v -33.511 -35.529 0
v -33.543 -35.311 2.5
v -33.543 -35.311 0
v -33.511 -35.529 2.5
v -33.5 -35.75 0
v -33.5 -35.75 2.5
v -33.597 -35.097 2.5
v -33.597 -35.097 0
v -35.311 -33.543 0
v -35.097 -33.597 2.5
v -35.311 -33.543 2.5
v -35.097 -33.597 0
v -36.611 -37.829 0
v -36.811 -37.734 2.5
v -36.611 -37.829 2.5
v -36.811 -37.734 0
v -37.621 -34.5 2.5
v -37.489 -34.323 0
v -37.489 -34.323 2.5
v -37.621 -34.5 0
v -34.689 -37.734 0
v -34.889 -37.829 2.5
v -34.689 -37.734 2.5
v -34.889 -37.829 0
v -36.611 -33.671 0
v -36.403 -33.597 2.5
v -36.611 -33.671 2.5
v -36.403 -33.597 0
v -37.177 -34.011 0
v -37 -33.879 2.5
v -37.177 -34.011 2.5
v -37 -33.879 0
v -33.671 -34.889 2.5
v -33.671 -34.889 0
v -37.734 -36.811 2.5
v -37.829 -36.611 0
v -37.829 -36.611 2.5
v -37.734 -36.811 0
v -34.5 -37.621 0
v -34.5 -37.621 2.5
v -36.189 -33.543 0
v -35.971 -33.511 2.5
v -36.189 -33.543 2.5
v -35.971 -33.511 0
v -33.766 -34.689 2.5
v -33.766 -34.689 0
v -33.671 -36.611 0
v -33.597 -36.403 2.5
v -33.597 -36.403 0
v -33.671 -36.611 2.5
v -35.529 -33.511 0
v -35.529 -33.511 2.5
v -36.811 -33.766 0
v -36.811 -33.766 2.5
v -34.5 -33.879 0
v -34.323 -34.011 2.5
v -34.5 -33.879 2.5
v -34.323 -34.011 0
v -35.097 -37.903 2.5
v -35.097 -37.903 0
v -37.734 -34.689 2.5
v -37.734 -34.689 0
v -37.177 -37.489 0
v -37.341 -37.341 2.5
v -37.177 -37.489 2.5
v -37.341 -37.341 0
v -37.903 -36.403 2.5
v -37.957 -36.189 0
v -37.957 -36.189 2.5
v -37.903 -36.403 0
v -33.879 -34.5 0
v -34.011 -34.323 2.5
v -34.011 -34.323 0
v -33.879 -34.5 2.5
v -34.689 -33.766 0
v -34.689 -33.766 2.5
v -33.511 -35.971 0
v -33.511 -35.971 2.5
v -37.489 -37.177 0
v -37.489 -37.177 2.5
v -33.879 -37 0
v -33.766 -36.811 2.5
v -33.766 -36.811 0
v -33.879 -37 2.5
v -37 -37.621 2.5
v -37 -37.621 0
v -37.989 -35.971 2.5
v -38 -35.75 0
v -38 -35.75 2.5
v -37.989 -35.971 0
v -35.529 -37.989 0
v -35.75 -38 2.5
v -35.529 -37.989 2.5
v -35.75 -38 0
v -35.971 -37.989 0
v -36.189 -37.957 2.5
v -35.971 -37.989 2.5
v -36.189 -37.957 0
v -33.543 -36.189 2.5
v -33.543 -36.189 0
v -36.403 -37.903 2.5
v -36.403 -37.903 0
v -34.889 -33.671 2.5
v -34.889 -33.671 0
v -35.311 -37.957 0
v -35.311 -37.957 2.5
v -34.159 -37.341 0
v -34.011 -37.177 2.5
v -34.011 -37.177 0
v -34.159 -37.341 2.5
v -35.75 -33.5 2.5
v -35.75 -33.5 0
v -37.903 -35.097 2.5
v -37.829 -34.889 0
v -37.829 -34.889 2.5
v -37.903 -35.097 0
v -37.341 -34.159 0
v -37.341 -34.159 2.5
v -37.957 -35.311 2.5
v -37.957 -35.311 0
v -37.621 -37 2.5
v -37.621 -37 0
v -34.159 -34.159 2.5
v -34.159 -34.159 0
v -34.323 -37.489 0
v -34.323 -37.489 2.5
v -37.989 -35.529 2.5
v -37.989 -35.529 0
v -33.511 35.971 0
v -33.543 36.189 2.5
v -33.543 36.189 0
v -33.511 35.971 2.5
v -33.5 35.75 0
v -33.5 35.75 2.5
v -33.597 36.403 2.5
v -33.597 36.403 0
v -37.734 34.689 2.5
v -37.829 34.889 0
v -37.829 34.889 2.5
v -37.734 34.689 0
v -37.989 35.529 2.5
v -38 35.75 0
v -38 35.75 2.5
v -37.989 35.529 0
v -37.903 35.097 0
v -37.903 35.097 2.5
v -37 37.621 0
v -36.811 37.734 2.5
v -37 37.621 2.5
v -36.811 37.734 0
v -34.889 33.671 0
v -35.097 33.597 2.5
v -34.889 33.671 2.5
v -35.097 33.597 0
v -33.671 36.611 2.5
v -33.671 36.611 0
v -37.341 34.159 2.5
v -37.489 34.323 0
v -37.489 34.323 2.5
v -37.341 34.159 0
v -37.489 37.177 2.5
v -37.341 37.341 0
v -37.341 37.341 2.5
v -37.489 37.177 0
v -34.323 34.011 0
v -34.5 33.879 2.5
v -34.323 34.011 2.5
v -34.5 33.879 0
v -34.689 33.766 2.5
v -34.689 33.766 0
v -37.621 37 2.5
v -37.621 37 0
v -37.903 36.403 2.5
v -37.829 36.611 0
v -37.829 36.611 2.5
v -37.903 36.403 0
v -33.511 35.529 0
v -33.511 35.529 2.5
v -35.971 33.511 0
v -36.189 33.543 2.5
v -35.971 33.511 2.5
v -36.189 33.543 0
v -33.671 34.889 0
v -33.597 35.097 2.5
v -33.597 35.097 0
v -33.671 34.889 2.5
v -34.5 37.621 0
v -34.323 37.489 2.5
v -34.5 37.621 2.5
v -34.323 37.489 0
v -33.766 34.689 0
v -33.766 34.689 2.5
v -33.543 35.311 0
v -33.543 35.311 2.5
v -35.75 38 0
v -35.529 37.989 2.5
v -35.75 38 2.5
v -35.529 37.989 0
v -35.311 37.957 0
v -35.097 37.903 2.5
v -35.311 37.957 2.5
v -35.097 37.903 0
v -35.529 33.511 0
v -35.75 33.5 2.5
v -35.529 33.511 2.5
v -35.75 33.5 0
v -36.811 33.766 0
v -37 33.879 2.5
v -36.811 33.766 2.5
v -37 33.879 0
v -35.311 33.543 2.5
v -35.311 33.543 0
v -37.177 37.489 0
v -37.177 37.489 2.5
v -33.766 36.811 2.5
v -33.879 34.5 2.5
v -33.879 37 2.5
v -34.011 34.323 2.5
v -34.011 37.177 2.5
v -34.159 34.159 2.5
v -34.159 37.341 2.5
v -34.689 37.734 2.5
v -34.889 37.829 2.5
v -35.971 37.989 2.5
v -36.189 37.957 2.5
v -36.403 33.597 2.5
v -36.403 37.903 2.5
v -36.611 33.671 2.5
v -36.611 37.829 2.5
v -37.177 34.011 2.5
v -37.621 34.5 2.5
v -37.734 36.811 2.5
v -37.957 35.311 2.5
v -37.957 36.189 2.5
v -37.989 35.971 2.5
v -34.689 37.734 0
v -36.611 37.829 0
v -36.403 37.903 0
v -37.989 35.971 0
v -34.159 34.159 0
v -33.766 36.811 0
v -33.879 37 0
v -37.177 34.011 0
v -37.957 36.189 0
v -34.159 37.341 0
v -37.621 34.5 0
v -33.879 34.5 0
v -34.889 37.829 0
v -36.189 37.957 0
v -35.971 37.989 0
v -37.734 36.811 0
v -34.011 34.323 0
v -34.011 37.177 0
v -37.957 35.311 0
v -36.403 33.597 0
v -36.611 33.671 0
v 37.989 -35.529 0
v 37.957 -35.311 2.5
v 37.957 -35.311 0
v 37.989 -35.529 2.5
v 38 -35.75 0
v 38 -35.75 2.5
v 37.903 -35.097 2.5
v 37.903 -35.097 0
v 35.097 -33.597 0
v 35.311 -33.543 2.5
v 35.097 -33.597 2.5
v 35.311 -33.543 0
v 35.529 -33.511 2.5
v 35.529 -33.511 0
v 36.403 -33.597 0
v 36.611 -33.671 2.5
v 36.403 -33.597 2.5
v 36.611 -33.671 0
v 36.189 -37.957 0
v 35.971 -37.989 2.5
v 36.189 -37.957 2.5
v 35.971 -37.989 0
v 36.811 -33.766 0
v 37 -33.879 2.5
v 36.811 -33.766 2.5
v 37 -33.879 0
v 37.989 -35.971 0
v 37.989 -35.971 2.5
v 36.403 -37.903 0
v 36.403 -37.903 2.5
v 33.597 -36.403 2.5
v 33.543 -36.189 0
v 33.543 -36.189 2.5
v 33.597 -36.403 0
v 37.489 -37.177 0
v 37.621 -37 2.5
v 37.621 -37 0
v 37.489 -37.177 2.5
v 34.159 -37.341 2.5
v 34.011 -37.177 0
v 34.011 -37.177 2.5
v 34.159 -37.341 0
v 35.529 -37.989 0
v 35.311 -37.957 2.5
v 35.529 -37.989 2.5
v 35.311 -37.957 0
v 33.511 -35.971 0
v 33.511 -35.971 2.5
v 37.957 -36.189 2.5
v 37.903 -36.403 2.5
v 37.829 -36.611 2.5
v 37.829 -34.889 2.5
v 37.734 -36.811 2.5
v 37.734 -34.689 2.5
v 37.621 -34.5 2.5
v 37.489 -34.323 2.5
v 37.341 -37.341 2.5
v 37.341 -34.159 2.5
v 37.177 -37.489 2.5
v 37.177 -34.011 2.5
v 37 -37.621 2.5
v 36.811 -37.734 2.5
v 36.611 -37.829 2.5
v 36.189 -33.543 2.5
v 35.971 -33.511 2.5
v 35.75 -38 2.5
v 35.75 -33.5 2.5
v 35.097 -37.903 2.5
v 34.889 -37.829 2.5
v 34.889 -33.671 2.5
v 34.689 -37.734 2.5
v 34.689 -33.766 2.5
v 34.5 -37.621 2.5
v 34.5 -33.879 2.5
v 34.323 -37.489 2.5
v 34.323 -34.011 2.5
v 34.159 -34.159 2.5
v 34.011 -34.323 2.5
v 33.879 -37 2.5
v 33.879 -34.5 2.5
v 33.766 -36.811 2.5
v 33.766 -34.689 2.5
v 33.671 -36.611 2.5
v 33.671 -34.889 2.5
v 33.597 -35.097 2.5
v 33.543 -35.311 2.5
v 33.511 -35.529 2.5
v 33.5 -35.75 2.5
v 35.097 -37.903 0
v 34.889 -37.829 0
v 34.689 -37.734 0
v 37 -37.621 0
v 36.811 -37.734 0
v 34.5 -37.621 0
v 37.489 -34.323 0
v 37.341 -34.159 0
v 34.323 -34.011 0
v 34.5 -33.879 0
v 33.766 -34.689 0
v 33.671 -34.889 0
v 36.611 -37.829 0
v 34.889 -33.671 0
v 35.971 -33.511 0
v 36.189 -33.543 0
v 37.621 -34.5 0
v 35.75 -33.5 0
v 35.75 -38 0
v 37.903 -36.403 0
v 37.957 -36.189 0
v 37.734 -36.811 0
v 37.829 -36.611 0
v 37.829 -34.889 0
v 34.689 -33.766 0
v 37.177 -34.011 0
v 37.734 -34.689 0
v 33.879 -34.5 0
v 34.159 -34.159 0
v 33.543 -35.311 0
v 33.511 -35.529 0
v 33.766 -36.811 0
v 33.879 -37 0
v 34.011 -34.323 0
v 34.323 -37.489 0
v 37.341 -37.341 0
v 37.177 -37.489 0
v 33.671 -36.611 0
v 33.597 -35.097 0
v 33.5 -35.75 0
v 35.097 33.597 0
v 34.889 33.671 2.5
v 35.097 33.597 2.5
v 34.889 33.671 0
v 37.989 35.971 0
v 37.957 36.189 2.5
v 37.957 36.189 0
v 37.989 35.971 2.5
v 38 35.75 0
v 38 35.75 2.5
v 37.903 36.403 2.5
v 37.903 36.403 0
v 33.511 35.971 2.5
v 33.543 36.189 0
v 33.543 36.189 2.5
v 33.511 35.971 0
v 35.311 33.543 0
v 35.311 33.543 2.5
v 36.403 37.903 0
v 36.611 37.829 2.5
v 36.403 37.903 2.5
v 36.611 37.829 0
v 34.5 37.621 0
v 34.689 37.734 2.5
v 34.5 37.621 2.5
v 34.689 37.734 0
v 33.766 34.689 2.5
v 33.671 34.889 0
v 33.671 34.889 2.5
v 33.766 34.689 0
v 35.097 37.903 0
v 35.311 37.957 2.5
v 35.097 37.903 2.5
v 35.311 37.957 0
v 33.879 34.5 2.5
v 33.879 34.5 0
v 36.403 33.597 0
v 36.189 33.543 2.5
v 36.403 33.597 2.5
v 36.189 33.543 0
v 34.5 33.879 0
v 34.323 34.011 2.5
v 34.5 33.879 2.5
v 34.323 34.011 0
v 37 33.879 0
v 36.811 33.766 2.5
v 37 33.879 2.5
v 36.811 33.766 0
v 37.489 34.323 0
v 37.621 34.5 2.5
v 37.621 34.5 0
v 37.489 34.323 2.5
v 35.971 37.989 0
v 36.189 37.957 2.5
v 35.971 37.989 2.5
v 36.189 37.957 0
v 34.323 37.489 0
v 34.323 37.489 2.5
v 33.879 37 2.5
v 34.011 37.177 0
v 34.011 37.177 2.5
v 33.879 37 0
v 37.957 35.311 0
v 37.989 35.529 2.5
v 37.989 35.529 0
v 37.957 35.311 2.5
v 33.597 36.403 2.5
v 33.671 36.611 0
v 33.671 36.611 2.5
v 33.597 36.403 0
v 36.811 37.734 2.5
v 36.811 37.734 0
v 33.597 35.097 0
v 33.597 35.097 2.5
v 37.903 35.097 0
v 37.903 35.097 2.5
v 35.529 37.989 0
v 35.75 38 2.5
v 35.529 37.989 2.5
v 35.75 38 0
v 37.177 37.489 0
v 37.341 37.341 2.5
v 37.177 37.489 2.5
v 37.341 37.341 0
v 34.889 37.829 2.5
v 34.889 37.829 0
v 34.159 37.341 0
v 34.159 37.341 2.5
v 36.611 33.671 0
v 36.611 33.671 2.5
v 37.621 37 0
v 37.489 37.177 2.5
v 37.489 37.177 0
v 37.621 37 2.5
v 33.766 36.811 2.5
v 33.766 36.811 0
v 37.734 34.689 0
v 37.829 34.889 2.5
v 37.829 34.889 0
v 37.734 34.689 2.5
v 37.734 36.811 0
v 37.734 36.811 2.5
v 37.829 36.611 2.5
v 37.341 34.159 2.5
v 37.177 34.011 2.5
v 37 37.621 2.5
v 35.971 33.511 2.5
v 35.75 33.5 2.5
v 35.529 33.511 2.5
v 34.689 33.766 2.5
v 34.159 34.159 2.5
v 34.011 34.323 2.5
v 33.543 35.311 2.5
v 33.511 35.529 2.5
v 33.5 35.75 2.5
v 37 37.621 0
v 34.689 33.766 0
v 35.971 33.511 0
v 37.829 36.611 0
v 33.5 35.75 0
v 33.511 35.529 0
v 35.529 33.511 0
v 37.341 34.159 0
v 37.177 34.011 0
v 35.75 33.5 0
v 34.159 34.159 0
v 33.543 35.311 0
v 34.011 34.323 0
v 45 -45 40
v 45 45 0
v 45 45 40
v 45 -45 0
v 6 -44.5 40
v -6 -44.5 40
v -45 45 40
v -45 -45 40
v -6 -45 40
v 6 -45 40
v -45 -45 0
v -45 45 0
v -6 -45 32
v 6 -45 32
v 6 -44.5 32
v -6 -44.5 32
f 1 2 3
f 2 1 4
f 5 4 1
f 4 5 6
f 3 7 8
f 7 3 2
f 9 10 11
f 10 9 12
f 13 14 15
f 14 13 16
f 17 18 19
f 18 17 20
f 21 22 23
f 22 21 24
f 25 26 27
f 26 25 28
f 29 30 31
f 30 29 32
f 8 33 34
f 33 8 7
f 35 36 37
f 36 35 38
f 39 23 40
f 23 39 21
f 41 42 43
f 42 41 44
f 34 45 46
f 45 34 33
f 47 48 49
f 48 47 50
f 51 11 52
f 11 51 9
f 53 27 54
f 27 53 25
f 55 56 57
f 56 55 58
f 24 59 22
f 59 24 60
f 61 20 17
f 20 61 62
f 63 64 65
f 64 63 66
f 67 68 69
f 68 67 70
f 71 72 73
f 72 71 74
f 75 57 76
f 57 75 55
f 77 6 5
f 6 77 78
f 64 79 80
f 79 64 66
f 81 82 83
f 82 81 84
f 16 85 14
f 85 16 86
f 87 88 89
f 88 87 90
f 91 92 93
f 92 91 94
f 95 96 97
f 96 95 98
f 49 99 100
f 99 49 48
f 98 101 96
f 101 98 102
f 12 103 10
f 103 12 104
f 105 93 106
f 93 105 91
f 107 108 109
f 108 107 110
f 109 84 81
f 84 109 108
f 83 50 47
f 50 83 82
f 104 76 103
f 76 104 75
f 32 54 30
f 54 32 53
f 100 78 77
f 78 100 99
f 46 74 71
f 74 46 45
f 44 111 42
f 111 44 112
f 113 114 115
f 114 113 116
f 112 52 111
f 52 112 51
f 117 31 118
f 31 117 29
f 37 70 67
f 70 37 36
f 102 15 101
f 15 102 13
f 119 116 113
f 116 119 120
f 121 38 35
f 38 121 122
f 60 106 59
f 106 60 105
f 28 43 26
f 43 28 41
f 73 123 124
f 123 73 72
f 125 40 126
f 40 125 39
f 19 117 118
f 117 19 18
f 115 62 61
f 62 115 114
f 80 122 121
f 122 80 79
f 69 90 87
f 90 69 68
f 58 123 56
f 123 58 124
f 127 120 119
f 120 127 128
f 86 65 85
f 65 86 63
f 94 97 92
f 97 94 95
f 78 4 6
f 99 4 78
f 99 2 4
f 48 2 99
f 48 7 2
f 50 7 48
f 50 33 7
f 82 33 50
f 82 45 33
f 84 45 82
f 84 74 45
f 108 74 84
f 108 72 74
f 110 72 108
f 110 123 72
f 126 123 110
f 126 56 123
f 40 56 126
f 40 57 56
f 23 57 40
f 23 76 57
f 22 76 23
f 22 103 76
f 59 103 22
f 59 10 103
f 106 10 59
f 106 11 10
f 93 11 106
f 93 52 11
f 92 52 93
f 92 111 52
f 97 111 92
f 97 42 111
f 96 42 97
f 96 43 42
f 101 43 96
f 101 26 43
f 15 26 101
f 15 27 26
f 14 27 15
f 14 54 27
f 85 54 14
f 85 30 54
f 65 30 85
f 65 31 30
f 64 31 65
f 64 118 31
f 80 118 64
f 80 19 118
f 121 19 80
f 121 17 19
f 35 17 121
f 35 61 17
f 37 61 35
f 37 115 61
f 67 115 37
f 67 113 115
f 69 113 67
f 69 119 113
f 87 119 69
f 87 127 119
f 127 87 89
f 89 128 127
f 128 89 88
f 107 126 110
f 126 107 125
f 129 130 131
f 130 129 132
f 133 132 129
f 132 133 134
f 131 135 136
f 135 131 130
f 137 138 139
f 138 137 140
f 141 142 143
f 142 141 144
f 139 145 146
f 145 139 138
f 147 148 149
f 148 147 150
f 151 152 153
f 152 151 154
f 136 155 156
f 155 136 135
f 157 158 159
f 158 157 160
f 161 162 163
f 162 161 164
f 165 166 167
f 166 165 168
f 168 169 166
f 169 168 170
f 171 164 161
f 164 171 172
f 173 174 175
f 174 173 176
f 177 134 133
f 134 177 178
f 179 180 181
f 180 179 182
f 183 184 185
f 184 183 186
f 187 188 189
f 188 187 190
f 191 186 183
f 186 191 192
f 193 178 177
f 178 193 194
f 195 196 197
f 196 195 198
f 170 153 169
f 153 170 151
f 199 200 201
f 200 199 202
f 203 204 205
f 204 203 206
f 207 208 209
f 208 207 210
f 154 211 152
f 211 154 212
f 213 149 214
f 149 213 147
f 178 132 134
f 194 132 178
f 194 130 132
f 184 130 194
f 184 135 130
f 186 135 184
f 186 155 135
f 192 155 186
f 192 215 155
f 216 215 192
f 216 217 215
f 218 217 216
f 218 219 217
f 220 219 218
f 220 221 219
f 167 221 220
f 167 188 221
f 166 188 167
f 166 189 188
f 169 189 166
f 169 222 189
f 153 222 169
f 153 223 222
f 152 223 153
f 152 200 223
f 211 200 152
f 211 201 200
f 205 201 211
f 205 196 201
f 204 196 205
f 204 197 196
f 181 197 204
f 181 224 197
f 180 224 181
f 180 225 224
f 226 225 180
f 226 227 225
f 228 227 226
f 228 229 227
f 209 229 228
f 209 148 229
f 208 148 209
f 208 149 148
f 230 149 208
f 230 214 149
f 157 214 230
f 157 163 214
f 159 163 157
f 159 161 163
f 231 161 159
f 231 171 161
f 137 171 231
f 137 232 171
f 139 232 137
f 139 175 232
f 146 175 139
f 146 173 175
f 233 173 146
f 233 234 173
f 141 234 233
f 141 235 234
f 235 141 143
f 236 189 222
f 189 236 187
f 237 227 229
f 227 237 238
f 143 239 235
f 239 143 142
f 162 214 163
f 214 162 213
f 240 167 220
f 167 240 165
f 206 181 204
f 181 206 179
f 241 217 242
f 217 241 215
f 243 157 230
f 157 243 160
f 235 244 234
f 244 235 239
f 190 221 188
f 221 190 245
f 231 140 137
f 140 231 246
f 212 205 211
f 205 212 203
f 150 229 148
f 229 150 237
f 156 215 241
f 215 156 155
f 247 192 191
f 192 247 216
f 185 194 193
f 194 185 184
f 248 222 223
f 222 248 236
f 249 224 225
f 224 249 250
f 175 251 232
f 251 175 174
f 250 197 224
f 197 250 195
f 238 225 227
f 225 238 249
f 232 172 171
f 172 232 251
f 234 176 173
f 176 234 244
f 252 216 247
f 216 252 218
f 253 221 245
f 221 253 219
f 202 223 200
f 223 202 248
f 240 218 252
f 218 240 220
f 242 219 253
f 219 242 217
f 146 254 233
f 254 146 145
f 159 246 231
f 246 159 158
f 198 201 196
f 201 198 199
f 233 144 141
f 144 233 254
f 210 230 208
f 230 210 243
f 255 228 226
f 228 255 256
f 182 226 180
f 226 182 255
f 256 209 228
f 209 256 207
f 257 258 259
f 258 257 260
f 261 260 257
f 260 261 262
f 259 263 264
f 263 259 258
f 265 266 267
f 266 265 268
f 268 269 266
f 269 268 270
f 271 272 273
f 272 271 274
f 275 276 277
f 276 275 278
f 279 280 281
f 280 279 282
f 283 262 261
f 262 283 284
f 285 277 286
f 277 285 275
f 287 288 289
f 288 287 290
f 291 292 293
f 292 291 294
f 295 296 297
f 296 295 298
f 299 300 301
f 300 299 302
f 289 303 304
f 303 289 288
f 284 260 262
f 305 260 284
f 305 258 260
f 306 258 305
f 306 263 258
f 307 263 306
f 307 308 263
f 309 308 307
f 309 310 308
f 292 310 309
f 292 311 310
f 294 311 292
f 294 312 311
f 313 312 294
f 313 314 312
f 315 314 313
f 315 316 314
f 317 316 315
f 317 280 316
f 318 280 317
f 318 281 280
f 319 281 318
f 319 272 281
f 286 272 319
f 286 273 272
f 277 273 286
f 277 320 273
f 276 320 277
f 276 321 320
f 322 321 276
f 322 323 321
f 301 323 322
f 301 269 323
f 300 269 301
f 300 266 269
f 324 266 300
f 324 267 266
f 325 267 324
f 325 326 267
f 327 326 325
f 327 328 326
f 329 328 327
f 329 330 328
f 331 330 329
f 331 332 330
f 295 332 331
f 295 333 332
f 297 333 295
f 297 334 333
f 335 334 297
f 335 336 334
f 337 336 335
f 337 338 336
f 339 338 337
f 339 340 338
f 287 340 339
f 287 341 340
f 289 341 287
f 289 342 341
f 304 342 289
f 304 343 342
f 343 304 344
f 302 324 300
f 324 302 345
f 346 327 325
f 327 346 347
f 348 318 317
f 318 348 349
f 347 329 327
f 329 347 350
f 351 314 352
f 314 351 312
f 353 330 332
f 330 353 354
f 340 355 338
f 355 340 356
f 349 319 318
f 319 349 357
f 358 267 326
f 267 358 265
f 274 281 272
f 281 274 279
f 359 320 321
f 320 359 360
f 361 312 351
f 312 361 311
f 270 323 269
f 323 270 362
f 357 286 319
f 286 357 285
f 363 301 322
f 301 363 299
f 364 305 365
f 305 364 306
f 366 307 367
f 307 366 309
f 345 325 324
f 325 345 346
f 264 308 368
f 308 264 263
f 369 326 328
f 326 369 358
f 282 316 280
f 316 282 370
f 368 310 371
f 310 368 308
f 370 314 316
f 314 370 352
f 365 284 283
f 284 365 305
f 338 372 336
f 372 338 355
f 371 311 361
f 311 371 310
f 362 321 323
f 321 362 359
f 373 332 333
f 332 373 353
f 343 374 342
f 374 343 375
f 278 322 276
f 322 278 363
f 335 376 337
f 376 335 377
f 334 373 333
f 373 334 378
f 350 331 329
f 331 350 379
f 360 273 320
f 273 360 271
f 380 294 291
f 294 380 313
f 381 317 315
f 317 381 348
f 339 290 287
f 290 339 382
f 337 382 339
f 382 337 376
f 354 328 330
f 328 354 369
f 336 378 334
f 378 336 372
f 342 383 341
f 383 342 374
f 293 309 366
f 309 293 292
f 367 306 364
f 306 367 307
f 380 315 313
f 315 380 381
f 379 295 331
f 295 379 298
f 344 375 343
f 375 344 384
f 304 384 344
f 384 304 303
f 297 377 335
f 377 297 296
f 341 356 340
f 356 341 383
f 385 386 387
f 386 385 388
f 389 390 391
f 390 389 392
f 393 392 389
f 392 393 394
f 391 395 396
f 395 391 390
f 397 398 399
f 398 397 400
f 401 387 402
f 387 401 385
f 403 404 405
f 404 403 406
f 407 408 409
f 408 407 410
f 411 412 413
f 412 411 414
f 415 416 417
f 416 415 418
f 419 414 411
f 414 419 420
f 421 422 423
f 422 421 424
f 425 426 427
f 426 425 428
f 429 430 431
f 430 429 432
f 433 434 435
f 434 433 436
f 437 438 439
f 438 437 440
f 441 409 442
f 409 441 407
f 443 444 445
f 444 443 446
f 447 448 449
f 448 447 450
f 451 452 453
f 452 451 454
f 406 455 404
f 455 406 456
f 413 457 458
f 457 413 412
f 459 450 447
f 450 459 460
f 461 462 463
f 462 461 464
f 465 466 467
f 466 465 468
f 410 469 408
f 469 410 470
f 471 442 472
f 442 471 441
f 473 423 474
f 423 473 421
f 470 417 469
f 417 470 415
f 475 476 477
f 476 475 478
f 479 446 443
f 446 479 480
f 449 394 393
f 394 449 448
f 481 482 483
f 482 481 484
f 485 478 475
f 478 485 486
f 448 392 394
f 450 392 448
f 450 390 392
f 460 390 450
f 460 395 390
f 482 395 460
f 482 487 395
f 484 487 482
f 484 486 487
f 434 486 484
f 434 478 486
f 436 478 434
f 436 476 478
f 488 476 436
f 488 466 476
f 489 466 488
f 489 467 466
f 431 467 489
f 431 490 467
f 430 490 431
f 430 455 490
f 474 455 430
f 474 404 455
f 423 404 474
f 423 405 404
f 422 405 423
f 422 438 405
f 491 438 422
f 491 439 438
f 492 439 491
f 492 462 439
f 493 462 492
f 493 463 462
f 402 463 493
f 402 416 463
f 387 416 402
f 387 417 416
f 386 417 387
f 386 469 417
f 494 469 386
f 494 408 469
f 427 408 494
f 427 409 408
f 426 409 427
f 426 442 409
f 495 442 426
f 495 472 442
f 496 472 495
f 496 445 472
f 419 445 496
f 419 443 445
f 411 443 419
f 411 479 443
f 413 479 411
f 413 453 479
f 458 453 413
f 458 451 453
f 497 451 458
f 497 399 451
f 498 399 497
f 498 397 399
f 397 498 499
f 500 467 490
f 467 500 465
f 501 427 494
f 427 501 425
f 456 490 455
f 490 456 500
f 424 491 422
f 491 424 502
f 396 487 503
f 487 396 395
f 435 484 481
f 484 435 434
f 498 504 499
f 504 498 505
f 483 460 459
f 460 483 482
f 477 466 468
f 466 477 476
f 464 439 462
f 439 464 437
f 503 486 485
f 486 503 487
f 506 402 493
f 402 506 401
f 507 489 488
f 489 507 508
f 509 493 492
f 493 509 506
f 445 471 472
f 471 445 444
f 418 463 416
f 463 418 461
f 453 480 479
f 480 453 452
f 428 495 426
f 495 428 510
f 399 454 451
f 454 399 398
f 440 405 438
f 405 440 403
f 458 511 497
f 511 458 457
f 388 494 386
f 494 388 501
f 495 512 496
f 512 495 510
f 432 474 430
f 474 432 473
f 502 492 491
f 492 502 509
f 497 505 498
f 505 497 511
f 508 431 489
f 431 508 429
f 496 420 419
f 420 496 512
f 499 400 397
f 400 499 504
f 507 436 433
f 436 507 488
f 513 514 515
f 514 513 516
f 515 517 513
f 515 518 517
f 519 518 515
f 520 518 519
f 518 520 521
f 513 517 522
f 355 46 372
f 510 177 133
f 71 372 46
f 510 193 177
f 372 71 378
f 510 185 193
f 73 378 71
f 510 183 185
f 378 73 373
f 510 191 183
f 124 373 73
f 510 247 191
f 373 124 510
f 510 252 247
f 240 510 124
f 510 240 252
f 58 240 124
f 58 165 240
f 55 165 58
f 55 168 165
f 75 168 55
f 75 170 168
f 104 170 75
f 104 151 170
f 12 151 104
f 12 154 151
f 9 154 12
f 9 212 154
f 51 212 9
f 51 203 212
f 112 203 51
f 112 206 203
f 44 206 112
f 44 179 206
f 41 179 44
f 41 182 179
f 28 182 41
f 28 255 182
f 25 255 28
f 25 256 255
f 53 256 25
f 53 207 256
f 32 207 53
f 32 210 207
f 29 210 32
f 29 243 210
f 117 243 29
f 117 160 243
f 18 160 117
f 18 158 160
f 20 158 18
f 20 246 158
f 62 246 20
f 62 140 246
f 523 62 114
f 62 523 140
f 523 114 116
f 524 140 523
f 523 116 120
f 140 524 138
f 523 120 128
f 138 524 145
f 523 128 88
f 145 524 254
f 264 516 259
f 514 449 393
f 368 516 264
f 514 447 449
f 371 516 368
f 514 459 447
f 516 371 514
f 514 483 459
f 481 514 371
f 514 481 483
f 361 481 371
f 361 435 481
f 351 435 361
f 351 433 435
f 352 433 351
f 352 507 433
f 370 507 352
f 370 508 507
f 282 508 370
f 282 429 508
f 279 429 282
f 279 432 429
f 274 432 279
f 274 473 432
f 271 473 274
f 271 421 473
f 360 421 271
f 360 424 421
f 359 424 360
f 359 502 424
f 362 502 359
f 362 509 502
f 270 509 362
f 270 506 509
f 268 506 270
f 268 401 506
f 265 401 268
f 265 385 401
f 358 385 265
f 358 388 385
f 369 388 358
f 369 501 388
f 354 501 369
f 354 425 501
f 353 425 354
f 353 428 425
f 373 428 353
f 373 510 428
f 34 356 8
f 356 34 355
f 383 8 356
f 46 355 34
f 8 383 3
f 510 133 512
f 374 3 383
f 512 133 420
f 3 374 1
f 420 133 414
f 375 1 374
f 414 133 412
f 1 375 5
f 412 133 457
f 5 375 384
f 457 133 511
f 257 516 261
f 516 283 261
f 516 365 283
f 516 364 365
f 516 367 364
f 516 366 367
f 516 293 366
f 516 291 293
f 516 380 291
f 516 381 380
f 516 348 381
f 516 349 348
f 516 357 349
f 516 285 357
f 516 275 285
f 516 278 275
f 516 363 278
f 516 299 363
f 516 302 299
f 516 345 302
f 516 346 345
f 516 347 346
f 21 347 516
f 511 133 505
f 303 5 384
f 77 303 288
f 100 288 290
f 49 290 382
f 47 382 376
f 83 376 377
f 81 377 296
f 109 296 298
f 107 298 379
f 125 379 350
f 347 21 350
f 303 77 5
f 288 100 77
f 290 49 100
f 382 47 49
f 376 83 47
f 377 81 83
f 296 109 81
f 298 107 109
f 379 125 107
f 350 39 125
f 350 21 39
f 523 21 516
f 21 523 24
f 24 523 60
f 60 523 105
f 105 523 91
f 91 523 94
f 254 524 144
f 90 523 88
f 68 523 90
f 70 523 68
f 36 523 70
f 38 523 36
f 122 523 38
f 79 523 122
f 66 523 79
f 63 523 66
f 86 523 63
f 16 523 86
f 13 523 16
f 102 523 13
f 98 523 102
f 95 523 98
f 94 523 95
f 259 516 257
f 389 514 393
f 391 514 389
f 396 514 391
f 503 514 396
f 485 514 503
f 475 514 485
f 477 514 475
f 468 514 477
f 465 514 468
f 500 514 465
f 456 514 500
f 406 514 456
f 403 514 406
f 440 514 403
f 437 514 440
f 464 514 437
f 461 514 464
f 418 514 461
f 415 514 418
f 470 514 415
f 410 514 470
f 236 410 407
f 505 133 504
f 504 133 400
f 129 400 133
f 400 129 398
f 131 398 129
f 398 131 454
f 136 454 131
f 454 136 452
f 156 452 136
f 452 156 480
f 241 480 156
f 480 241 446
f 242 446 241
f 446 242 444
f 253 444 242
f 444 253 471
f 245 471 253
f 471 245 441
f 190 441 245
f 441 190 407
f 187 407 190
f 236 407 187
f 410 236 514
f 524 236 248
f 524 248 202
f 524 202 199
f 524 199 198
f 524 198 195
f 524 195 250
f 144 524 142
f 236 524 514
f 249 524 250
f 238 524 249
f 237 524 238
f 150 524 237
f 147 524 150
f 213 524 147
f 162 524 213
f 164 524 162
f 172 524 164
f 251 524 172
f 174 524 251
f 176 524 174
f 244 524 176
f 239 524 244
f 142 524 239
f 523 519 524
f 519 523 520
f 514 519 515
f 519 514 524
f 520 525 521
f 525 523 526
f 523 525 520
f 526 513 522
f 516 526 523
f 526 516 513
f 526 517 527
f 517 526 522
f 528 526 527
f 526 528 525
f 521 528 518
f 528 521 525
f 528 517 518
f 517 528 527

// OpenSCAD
// Magnetic stirrer housing - open box covering an 80 mm PC fan
// Print orientation: top plate on bed (z = 0), walls rise to z = 40

// ---- Dimensions (mm) ----
top_t       = 2;     // top plate thickness
wall_t      = 2.5;   // wall thickness
box_h       = 40;    // wall height (open top at z = 40)
outer_w     = 90;    // outer size in X and Y
hole_d      = 4.5;   // M4 screw hole diameter
hole_pitch  = 71.5;  // square pattern size for screw holes
notch_w     = 12;    // cable notch width
notch_bottom = 8;    // notch depth from open edge (z = 32 to 40)
eps         = 0.5;   // cutter overshoot past faces

$fn = 64;

difference() {
    // Solid box: outer dimensions, open top
    translate([-outer_w/2, -outer_w/2, 0])
        cube([outer_w, outer_w, box_h]);

    // Fan mounting holes through the top plate
    for (sx = [-hole_pitch/2, hole_pitch/2])
        for (sy = [-hole_pitch/2, hole_pitch/2])
            translate([sx, sy, -eps])
                cylinder(d = hole_d, h = top_t + 2*eps);

    // Cable notch in one wall, centred along the wall
    translate([-notch_w/2, -outer_w/2 - wall_t, box_h - notch_bottom])
        cube([notch_w, wall_t + eps, notch_bottom + eps]);
}
